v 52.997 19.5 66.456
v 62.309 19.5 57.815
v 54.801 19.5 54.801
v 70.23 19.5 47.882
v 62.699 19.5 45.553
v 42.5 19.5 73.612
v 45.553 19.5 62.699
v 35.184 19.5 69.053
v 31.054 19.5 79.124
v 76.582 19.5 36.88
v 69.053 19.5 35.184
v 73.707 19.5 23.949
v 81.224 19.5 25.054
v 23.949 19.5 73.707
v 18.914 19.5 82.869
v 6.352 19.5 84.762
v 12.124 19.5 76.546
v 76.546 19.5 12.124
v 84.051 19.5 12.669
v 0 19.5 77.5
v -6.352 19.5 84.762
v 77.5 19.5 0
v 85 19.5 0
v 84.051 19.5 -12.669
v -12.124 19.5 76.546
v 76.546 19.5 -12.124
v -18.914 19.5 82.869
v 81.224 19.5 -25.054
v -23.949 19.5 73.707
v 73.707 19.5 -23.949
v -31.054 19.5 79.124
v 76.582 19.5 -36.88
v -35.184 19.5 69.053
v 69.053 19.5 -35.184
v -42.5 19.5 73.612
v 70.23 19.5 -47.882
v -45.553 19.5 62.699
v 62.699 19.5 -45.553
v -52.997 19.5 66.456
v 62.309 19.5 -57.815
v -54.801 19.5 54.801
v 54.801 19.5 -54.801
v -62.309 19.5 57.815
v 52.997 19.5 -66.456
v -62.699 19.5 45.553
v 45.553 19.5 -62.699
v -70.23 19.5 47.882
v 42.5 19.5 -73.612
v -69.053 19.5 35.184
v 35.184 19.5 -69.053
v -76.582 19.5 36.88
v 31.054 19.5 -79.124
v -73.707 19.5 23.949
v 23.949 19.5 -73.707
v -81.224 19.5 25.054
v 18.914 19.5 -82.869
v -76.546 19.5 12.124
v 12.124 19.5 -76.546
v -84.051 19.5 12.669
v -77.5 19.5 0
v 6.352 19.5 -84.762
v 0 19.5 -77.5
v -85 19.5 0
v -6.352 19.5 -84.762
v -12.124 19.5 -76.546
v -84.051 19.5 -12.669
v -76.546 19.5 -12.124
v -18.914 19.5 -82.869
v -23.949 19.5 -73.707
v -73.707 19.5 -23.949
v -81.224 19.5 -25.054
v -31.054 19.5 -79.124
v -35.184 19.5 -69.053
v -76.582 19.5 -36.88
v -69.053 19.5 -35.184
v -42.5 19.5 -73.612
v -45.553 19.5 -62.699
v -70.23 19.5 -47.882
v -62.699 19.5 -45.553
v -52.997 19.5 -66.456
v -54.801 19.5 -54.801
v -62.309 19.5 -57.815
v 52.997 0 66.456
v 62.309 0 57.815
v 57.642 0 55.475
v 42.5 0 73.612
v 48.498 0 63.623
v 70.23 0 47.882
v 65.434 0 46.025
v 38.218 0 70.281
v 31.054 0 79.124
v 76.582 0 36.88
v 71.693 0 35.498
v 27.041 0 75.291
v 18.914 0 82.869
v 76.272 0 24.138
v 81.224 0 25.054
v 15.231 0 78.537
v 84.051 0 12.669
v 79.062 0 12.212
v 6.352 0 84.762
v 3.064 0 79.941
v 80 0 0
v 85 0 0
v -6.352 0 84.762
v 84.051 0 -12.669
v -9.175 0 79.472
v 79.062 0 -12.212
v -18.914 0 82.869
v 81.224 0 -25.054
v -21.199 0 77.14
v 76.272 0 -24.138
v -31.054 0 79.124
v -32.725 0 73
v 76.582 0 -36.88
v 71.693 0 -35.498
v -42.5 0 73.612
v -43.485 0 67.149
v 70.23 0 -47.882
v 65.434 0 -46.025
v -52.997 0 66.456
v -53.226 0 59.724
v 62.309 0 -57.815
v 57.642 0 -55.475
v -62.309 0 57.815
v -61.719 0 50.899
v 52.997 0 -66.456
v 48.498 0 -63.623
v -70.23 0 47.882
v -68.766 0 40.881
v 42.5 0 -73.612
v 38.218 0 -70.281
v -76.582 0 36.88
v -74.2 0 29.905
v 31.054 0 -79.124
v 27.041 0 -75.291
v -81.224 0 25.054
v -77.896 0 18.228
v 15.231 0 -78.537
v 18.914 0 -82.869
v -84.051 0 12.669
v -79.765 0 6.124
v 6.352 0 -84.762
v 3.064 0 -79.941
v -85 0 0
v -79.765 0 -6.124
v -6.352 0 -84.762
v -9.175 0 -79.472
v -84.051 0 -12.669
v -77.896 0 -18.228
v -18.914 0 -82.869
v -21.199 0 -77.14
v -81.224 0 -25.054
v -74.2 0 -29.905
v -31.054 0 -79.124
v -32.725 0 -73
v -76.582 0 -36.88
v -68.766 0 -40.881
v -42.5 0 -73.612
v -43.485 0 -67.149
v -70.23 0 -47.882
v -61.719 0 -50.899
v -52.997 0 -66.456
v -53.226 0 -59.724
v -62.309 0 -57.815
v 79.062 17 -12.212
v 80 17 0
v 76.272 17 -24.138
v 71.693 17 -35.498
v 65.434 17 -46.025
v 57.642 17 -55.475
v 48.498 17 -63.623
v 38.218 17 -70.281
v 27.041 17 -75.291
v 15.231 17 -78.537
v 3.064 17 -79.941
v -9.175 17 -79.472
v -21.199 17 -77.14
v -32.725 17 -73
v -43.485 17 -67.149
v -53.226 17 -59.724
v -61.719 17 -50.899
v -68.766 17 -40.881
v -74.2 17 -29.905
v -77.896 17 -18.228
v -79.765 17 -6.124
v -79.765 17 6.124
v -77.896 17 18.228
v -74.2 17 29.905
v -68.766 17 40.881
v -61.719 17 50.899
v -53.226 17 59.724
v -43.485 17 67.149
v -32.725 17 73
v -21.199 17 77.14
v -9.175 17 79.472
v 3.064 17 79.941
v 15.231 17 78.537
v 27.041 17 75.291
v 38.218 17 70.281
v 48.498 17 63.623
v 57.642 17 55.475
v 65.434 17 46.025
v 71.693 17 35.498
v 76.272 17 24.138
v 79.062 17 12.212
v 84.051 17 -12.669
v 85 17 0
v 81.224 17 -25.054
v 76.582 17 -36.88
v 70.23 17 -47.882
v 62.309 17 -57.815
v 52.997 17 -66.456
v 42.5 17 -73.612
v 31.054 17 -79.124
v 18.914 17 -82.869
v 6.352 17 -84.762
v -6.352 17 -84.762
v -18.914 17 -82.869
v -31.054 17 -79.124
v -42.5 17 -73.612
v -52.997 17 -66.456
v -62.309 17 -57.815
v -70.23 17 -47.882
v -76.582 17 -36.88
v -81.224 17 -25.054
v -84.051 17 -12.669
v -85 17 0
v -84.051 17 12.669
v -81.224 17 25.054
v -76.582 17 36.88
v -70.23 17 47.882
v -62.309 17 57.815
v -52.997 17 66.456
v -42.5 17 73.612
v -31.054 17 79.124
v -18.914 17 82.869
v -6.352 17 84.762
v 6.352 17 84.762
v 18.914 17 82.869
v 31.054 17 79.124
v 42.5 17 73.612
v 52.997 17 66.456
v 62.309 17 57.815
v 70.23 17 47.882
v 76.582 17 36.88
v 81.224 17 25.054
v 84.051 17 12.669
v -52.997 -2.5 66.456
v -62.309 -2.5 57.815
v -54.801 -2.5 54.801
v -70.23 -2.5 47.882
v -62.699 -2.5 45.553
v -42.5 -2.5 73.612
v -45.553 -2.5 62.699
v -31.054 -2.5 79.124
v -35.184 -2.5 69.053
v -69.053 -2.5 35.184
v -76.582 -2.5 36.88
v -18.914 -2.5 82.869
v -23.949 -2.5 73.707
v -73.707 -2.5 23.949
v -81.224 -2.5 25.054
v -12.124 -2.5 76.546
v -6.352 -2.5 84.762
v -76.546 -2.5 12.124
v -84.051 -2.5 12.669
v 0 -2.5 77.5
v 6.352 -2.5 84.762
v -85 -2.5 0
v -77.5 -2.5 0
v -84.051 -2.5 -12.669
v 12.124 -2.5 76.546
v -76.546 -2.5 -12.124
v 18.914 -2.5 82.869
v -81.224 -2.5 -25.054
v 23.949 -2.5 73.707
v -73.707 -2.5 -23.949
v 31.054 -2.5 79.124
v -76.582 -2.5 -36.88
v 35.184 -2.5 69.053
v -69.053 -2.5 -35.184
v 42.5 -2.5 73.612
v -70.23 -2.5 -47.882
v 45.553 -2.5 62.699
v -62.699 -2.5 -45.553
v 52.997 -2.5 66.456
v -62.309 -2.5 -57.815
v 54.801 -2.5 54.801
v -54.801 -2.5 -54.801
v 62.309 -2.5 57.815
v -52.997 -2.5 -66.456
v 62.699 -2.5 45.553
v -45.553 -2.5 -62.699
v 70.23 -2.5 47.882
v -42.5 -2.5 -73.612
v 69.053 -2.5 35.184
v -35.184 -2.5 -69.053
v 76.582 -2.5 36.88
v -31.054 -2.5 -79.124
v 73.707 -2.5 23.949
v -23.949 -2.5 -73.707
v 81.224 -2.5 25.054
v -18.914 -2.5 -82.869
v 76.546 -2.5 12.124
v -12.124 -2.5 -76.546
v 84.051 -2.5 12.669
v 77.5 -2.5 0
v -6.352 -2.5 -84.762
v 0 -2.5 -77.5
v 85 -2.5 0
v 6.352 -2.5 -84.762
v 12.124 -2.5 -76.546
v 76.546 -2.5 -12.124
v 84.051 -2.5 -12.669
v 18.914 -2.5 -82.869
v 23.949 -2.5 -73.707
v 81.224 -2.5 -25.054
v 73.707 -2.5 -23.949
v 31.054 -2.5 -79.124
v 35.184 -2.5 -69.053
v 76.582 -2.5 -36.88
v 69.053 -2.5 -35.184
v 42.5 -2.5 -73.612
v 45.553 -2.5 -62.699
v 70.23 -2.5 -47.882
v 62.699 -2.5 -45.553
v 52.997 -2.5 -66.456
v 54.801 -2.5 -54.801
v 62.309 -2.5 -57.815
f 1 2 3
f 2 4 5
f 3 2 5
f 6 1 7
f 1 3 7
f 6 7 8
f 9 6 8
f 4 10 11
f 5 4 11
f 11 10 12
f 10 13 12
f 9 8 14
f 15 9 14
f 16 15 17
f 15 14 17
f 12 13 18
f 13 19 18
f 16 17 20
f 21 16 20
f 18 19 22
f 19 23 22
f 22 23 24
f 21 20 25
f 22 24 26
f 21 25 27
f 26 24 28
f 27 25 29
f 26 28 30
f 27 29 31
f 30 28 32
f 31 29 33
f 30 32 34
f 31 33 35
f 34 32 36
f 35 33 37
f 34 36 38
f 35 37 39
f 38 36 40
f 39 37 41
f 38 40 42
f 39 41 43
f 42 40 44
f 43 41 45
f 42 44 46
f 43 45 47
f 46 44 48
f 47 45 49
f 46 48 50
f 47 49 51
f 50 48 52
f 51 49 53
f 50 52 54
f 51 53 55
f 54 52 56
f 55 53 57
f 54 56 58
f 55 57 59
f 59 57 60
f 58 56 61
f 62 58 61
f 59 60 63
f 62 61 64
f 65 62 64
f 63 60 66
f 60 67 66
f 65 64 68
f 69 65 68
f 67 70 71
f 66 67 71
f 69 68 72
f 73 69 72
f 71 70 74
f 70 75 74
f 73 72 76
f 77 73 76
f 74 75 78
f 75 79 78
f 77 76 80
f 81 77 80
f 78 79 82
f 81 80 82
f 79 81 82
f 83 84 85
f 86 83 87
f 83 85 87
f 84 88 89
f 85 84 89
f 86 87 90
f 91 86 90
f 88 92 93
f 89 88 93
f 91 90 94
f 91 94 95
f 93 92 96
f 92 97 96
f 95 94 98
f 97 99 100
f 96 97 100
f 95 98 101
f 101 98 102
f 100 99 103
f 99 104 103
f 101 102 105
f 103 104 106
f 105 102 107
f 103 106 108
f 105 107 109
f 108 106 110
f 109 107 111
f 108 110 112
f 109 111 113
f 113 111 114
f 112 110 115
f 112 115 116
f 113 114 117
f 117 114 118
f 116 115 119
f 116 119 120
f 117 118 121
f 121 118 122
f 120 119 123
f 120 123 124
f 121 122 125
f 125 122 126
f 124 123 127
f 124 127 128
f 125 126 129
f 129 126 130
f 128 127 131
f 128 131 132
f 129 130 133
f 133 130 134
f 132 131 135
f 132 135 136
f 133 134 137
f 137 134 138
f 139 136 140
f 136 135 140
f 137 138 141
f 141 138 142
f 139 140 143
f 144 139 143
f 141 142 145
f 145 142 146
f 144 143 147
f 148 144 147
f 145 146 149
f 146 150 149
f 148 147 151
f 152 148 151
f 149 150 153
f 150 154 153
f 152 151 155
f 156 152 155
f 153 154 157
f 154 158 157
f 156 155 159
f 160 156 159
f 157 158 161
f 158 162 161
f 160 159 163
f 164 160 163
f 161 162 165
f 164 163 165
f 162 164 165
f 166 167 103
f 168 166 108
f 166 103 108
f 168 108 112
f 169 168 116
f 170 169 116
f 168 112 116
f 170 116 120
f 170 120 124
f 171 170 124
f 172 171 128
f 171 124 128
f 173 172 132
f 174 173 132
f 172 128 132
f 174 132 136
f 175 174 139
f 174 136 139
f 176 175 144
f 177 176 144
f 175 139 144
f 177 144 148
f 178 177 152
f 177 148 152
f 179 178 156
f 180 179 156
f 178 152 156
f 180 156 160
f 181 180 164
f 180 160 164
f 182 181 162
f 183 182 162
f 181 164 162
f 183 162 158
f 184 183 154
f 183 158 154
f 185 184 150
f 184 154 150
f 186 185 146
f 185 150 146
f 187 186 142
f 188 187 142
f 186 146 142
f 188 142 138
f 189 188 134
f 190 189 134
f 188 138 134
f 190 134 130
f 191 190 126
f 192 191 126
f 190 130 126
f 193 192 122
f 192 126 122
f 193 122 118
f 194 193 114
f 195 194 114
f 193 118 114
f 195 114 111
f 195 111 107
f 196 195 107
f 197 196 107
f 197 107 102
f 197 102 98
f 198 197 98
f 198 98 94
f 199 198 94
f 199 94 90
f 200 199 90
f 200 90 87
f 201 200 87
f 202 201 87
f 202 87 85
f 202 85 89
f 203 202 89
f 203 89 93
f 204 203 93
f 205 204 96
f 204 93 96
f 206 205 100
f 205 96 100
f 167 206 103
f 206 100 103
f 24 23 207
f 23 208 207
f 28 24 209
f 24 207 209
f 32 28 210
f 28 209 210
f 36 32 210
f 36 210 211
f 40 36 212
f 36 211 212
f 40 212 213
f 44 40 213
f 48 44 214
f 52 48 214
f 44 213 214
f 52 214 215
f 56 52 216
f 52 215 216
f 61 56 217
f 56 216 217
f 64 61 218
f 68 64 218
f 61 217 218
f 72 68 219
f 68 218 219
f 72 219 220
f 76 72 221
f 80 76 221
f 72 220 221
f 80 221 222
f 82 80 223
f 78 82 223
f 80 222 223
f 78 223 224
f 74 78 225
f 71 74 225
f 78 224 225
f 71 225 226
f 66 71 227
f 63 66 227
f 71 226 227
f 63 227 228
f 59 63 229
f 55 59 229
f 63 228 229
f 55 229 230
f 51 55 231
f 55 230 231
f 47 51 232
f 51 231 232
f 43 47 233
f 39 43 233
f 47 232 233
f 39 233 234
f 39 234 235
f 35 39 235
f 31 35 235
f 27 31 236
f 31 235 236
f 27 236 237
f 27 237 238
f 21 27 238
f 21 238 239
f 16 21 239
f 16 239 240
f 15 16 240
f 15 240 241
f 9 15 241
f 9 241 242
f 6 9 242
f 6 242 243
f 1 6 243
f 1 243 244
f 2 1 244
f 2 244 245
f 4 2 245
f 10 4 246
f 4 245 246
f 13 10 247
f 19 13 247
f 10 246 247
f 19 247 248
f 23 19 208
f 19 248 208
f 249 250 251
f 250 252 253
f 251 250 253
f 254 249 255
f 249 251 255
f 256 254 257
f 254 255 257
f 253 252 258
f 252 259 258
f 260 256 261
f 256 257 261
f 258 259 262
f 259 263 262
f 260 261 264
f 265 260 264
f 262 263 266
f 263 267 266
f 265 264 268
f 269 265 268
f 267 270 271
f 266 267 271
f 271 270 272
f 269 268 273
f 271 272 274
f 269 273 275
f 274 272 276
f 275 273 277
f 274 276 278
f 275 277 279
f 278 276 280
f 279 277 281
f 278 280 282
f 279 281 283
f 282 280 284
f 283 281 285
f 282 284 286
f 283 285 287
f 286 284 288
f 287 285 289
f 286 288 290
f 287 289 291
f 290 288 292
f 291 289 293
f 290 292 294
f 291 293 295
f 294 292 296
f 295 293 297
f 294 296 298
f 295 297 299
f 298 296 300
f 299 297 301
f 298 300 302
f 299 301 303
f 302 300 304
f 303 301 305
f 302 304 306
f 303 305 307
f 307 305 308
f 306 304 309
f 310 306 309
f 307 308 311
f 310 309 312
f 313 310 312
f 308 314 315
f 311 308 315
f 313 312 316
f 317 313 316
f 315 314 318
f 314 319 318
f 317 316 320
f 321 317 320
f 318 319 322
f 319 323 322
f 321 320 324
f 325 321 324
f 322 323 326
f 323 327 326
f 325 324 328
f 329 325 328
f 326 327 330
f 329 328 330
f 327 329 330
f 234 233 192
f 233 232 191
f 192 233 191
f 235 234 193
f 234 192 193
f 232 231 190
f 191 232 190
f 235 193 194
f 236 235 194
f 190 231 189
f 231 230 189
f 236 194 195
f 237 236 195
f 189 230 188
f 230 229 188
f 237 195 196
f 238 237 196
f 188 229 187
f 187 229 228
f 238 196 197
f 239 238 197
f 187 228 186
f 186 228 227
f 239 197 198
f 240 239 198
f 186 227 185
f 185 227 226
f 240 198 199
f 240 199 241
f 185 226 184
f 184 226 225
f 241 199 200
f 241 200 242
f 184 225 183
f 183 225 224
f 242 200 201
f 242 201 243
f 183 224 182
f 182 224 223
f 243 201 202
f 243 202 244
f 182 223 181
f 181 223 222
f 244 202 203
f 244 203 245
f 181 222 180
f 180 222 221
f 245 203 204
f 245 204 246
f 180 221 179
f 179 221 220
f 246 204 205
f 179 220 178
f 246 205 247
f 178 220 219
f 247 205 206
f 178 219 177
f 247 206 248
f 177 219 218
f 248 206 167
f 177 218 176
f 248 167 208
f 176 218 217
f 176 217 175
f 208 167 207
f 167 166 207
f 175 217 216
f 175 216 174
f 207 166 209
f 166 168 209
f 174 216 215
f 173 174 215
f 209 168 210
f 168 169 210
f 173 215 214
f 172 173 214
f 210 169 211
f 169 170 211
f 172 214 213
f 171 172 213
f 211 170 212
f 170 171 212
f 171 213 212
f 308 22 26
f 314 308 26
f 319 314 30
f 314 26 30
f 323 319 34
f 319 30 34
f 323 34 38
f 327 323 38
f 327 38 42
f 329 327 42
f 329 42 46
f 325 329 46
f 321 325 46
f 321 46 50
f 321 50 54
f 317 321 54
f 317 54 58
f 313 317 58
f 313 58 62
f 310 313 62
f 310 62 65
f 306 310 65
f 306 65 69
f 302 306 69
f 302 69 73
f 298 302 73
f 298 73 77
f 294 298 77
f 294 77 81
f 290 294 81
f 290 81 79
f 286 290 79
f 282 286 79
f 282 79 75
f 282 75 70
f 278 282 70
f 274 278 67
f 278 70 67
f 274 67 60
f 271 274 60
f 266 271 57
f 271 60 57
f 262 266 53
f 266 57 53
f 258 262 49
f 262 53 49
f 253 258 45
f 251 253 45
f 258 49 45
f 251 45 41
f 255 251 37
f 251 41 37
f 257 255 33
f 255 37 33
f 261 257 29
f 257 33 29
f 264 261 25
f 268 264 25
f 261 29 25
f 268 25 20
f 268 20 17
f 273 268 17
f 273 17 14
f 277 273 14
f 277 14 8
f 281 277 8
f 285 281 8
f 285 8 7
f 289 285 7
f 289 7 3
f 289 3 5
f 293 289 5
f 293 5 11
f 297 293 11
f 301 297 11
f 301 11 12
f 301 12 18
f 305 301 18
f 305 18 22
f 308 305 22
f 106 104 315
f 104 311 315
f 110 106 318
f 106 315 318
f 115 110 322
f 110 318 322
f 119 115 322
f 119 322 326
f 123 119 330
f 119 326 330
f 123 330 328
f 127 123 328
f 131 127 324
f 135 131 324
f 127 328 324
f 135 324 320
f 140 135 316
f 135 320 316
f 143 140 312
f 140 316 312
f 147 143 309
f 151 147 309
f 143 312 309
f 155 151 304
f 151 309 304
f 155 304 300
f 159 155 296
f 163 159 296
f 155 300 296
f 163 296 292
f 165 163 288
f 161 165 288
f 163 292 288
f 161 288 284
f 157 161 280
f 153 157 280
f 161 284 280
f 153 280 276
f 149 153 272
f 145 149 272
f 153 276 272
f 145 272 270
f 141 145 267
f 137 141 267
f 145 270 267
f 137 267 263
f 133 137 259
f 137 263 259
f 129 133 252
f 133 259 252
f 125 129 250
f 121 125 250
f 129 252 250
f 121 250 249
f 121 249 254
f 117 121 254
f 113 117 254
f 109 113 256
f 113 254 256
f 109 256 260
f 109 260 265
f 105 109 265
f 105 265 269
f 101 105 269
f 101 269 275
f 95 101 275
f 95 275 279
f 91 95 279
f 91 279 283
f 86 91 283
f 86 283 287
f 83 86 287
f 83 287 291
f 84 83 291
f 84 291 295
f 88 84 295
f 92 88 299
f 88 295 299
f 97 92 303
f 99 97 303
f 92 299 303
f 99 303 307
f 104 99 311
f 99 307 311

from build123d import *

# Parameters (mm, degrees)
CUT_EXTRUDE1_REACH = 4.5
SKETCH2_R          = 77.5


with BuildPart() as part:
    # Sketch1 → Revolve1 (revolve)
    with BuildSketch(Plane.XY):
        Polygon((0, 0), (77.5, 0), (77.5, 19.5), (85, 19.5), (85, 17), (80, 17), (80, 0), (85, 0), (85, -2.5), (0, -2.5), align=None)
    revolve(axis=Axis((0, -2.5, 0), (0, 1, 0)))

    # Sketch2 → Cut-Extrude1 (cut, up to next)
    with BuildSketch(Plane(origin=(0, 0, 0), x_dir=(1, 0, 0), z_dir=(0, 1, 0)), mode=Mode.PRIVATE) as cut_extrude1_sk1:
        Circle(SKETCH2_R)
    cut_extrude1_tool1 = extrude(cut_extrude1_sk1.sketch, amount=-CUT_EXTRUDE1_REACH, mode=Mode.PRIVATE) & part.part
    add(cut_extrude1_tool1.solids().sort_by_distance((0, 0, 0))[0], mode=Mode.SUBTRACT)


solid = part.part
